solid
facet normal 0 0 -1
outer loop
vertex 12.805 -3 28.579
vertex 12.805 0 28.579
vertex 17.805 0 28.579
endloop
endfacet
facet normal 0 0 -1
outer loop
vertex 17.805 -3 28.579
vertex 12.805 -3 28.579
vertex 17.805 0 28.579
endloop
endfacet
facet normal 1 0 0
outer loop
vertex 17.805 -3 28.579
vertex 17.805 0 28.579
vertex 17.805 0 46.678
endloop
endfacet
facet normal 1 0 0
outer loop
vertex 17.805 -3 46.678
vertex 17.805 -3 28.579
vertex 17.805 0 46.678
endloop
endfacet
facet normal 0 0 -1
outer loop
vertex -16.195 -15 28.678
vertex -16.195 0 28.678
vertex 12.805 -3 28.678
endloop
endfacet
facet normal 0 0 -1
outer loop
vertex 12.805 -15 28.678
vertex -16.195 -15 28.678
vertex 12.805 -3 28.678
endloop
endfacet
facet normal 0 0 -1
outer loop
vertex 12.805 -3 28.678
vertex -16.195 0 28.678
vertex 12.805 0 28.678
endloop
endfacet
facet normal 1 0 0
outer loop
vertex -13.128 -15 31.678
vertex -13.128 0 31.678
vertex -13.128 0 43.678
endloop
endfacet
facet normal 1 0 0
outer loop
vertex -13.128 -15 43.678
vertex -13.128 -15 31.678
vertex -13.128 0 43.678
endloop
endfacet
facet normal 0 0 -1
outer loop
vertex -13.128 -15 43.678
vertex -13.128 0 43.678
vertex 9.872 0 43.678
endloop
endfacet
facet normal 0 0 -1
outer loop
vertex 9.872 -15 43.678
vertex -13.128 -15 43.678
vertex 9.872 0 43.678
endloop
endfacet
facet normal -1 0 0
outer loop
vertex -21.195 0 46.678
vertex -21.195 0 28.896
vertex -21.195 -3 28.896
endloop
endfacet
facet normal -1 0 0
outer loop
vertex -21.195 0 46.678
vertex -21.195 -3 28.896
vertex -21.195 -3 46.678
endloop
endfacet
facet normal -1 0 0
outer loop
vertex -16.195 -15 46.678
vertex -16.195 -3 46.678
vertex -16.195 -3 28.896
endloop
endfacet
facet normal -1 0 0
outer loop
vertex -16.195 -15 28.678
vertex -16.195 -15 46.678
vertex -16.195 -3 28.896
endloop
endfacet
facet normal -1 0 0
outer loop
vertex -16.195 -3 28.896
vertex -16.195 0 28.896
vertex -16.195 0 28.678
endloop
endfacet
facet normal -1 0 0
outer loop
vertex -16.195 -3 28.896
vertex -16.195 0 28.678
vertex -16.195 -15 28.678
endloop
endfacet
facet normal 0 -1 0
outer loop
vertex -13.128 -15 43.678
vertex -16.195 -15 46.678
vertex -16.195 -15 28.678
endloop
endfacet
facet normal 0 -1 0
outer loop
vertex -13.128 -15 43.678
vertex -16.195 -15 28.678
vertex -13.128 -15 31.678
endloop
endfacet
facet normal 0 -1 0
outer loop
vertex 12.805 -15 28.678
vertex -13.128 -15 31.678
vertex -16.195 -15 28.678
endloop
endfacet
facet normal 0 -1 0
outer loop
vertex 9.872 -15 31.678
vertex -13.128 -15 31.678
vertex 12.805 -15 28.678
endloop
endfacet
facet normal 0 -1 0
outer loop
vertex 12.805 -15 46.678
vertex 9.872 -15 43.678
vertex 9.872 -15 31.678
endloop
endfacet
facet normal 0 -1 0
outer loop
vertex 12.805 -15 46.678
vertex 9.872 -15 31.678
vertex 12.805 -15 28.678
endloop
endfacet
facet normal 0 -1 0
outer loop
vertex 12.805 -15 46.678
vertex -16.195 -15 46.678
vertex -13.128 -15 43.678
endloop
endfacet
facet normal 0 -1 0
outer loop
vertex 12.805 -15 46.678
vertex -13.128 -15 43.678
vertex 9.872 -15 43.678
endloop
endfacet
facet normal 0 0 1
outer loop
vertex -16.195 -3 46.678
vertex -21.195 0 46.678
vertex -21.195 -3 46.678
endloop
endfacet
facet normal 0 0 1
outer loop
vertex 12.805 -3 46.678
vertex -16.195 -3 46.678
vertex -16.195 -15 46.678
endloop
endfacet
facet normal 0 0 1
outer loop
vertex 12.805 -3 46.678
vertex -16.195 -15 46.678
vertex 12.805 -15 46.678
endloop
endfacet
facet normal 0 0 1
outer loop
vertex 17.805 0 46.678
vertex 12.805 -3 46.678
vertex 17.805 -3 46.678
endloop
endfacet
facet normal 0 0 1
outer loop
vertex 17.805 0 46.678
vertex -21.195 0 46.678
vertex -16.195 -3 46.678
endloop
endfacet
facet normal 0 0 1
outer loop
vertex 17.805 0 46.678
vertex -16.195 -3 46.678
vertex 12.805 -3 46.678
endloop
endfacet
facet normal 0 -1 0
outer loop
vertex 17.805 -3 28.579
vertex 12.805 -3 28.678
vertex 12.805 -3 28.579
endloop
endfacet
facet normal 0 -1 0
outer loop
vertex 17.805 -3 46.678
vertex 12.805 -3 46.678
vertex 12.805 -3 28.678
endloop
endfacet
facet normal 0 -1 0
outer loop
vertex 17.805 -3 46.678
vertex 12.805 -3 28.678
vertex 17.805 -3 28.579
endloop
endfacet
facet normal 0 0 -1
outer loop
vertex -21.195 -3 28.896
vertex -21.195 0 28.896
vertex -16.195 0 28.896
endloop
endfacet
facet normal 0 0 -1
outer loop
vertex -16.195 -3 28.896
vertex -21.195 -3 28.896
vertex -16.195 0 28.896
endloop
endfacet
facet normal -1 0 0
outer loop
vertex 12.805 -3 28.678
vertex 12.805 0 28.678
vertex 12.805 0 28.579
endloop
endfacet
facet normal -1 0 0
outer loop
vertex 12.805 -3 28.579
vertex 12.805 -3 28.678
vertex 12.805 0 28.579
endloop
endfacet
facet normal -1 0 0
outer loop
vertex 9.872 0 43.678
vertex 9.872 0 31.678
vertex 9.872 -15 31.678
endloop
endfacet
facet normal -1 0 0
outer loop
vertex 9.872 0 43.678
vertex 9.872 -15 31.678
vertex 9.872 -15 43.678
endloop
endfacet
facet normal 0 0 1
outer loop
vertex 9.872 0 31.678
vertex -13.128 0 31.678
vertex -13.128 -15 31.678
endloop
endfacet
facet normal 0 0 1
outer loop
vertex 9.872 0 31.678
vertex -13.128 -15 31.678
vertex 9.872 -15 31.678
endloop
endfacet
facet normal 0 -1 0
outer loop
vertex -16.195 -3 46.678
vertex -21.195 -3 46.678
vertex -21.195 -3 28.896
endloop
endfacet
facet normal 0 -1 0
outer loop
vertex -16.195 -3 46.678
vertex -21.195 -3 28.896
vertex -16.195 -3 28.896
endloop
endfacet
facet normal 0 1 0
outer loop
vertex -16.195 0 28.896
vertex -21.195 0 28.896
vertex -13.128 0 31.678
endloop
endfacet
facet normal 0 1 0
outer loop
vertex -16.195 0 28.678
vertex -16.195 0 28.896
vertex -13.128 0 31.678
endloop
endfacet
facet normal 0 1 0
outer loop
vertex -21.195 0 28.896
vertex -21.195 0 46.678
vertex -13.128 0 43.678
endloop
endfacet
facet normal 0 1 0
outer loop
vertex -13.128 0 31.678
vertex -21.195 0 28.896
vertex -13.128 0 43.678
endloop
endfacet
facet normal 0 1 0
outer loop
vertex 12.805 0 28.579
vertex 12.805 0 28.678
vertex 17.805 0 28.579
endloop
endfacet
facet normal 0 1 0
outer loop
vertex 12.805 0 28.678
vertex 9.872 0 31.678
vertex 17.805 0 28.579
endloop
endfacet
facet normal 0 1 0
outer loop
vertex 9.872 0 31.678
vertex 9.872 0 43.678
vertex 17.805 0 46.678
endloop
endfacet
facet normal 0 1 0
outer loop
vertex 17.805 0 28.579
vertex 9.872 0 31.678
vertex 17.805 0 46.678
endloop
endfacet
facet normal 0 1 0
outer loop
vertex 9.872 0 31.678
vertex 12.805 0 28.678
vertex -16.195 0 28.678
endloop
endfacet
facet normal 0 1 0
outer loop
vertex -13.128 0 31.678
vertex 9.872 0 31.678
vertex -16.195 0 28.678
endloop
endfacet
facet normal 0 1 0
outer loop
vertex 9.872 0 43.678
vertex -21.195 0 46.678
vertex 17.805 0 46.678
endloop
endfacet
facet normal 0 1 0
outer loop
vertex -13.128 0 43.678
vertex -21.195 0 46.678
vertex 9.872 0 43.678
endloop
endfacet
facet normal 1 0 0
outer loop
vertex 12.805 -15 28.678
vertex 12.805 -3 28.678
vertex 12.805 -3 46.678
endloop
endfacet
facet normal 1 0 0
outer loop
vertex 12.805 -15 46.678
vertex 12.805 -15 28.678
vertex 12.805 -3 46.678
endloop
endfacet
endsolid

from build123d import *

# Parameters (mm, degrees)
F0_W     = 23
F0_H     = 12
F1_DEPTH = 15
F0_W_2   = 5
F0_H_2   = 17.782256
F2_DEPTH = 3


with BuildPart() as f1:
    # F0 (on Front) → F1 (new body)
    with BuildSketch(Plane.XZ):
        Polygon((12.80545, 46.678425), (-16.19455, 46.678425), (-16.19455, 28.896169), (-16.19455, 28.678425), (12.80545, 28.678425), align=None)
        with Locations((-1.62795, 37.678425)):
            Rectangle(F0_W, F0_H, mode=Mode.SUBTRACT)
    extrude(amount=F1_DEPTH)

    # F0 (on Front) → F2 (join)
    with BuildSketch(Plane.XZ):
        with Locations((-18.69455, 37.787297)):
            Rectangle(F0_W_2, F0_H_2)
        Polygon((17.80545, 46.678425), (12.80545, 46.678425), (12.80545, 28.678425), (12.80545, 28.578629), (17.80545, 28.578629), align=None)
    extrude(amount=F2_DEPTH)


solid = f1.part
